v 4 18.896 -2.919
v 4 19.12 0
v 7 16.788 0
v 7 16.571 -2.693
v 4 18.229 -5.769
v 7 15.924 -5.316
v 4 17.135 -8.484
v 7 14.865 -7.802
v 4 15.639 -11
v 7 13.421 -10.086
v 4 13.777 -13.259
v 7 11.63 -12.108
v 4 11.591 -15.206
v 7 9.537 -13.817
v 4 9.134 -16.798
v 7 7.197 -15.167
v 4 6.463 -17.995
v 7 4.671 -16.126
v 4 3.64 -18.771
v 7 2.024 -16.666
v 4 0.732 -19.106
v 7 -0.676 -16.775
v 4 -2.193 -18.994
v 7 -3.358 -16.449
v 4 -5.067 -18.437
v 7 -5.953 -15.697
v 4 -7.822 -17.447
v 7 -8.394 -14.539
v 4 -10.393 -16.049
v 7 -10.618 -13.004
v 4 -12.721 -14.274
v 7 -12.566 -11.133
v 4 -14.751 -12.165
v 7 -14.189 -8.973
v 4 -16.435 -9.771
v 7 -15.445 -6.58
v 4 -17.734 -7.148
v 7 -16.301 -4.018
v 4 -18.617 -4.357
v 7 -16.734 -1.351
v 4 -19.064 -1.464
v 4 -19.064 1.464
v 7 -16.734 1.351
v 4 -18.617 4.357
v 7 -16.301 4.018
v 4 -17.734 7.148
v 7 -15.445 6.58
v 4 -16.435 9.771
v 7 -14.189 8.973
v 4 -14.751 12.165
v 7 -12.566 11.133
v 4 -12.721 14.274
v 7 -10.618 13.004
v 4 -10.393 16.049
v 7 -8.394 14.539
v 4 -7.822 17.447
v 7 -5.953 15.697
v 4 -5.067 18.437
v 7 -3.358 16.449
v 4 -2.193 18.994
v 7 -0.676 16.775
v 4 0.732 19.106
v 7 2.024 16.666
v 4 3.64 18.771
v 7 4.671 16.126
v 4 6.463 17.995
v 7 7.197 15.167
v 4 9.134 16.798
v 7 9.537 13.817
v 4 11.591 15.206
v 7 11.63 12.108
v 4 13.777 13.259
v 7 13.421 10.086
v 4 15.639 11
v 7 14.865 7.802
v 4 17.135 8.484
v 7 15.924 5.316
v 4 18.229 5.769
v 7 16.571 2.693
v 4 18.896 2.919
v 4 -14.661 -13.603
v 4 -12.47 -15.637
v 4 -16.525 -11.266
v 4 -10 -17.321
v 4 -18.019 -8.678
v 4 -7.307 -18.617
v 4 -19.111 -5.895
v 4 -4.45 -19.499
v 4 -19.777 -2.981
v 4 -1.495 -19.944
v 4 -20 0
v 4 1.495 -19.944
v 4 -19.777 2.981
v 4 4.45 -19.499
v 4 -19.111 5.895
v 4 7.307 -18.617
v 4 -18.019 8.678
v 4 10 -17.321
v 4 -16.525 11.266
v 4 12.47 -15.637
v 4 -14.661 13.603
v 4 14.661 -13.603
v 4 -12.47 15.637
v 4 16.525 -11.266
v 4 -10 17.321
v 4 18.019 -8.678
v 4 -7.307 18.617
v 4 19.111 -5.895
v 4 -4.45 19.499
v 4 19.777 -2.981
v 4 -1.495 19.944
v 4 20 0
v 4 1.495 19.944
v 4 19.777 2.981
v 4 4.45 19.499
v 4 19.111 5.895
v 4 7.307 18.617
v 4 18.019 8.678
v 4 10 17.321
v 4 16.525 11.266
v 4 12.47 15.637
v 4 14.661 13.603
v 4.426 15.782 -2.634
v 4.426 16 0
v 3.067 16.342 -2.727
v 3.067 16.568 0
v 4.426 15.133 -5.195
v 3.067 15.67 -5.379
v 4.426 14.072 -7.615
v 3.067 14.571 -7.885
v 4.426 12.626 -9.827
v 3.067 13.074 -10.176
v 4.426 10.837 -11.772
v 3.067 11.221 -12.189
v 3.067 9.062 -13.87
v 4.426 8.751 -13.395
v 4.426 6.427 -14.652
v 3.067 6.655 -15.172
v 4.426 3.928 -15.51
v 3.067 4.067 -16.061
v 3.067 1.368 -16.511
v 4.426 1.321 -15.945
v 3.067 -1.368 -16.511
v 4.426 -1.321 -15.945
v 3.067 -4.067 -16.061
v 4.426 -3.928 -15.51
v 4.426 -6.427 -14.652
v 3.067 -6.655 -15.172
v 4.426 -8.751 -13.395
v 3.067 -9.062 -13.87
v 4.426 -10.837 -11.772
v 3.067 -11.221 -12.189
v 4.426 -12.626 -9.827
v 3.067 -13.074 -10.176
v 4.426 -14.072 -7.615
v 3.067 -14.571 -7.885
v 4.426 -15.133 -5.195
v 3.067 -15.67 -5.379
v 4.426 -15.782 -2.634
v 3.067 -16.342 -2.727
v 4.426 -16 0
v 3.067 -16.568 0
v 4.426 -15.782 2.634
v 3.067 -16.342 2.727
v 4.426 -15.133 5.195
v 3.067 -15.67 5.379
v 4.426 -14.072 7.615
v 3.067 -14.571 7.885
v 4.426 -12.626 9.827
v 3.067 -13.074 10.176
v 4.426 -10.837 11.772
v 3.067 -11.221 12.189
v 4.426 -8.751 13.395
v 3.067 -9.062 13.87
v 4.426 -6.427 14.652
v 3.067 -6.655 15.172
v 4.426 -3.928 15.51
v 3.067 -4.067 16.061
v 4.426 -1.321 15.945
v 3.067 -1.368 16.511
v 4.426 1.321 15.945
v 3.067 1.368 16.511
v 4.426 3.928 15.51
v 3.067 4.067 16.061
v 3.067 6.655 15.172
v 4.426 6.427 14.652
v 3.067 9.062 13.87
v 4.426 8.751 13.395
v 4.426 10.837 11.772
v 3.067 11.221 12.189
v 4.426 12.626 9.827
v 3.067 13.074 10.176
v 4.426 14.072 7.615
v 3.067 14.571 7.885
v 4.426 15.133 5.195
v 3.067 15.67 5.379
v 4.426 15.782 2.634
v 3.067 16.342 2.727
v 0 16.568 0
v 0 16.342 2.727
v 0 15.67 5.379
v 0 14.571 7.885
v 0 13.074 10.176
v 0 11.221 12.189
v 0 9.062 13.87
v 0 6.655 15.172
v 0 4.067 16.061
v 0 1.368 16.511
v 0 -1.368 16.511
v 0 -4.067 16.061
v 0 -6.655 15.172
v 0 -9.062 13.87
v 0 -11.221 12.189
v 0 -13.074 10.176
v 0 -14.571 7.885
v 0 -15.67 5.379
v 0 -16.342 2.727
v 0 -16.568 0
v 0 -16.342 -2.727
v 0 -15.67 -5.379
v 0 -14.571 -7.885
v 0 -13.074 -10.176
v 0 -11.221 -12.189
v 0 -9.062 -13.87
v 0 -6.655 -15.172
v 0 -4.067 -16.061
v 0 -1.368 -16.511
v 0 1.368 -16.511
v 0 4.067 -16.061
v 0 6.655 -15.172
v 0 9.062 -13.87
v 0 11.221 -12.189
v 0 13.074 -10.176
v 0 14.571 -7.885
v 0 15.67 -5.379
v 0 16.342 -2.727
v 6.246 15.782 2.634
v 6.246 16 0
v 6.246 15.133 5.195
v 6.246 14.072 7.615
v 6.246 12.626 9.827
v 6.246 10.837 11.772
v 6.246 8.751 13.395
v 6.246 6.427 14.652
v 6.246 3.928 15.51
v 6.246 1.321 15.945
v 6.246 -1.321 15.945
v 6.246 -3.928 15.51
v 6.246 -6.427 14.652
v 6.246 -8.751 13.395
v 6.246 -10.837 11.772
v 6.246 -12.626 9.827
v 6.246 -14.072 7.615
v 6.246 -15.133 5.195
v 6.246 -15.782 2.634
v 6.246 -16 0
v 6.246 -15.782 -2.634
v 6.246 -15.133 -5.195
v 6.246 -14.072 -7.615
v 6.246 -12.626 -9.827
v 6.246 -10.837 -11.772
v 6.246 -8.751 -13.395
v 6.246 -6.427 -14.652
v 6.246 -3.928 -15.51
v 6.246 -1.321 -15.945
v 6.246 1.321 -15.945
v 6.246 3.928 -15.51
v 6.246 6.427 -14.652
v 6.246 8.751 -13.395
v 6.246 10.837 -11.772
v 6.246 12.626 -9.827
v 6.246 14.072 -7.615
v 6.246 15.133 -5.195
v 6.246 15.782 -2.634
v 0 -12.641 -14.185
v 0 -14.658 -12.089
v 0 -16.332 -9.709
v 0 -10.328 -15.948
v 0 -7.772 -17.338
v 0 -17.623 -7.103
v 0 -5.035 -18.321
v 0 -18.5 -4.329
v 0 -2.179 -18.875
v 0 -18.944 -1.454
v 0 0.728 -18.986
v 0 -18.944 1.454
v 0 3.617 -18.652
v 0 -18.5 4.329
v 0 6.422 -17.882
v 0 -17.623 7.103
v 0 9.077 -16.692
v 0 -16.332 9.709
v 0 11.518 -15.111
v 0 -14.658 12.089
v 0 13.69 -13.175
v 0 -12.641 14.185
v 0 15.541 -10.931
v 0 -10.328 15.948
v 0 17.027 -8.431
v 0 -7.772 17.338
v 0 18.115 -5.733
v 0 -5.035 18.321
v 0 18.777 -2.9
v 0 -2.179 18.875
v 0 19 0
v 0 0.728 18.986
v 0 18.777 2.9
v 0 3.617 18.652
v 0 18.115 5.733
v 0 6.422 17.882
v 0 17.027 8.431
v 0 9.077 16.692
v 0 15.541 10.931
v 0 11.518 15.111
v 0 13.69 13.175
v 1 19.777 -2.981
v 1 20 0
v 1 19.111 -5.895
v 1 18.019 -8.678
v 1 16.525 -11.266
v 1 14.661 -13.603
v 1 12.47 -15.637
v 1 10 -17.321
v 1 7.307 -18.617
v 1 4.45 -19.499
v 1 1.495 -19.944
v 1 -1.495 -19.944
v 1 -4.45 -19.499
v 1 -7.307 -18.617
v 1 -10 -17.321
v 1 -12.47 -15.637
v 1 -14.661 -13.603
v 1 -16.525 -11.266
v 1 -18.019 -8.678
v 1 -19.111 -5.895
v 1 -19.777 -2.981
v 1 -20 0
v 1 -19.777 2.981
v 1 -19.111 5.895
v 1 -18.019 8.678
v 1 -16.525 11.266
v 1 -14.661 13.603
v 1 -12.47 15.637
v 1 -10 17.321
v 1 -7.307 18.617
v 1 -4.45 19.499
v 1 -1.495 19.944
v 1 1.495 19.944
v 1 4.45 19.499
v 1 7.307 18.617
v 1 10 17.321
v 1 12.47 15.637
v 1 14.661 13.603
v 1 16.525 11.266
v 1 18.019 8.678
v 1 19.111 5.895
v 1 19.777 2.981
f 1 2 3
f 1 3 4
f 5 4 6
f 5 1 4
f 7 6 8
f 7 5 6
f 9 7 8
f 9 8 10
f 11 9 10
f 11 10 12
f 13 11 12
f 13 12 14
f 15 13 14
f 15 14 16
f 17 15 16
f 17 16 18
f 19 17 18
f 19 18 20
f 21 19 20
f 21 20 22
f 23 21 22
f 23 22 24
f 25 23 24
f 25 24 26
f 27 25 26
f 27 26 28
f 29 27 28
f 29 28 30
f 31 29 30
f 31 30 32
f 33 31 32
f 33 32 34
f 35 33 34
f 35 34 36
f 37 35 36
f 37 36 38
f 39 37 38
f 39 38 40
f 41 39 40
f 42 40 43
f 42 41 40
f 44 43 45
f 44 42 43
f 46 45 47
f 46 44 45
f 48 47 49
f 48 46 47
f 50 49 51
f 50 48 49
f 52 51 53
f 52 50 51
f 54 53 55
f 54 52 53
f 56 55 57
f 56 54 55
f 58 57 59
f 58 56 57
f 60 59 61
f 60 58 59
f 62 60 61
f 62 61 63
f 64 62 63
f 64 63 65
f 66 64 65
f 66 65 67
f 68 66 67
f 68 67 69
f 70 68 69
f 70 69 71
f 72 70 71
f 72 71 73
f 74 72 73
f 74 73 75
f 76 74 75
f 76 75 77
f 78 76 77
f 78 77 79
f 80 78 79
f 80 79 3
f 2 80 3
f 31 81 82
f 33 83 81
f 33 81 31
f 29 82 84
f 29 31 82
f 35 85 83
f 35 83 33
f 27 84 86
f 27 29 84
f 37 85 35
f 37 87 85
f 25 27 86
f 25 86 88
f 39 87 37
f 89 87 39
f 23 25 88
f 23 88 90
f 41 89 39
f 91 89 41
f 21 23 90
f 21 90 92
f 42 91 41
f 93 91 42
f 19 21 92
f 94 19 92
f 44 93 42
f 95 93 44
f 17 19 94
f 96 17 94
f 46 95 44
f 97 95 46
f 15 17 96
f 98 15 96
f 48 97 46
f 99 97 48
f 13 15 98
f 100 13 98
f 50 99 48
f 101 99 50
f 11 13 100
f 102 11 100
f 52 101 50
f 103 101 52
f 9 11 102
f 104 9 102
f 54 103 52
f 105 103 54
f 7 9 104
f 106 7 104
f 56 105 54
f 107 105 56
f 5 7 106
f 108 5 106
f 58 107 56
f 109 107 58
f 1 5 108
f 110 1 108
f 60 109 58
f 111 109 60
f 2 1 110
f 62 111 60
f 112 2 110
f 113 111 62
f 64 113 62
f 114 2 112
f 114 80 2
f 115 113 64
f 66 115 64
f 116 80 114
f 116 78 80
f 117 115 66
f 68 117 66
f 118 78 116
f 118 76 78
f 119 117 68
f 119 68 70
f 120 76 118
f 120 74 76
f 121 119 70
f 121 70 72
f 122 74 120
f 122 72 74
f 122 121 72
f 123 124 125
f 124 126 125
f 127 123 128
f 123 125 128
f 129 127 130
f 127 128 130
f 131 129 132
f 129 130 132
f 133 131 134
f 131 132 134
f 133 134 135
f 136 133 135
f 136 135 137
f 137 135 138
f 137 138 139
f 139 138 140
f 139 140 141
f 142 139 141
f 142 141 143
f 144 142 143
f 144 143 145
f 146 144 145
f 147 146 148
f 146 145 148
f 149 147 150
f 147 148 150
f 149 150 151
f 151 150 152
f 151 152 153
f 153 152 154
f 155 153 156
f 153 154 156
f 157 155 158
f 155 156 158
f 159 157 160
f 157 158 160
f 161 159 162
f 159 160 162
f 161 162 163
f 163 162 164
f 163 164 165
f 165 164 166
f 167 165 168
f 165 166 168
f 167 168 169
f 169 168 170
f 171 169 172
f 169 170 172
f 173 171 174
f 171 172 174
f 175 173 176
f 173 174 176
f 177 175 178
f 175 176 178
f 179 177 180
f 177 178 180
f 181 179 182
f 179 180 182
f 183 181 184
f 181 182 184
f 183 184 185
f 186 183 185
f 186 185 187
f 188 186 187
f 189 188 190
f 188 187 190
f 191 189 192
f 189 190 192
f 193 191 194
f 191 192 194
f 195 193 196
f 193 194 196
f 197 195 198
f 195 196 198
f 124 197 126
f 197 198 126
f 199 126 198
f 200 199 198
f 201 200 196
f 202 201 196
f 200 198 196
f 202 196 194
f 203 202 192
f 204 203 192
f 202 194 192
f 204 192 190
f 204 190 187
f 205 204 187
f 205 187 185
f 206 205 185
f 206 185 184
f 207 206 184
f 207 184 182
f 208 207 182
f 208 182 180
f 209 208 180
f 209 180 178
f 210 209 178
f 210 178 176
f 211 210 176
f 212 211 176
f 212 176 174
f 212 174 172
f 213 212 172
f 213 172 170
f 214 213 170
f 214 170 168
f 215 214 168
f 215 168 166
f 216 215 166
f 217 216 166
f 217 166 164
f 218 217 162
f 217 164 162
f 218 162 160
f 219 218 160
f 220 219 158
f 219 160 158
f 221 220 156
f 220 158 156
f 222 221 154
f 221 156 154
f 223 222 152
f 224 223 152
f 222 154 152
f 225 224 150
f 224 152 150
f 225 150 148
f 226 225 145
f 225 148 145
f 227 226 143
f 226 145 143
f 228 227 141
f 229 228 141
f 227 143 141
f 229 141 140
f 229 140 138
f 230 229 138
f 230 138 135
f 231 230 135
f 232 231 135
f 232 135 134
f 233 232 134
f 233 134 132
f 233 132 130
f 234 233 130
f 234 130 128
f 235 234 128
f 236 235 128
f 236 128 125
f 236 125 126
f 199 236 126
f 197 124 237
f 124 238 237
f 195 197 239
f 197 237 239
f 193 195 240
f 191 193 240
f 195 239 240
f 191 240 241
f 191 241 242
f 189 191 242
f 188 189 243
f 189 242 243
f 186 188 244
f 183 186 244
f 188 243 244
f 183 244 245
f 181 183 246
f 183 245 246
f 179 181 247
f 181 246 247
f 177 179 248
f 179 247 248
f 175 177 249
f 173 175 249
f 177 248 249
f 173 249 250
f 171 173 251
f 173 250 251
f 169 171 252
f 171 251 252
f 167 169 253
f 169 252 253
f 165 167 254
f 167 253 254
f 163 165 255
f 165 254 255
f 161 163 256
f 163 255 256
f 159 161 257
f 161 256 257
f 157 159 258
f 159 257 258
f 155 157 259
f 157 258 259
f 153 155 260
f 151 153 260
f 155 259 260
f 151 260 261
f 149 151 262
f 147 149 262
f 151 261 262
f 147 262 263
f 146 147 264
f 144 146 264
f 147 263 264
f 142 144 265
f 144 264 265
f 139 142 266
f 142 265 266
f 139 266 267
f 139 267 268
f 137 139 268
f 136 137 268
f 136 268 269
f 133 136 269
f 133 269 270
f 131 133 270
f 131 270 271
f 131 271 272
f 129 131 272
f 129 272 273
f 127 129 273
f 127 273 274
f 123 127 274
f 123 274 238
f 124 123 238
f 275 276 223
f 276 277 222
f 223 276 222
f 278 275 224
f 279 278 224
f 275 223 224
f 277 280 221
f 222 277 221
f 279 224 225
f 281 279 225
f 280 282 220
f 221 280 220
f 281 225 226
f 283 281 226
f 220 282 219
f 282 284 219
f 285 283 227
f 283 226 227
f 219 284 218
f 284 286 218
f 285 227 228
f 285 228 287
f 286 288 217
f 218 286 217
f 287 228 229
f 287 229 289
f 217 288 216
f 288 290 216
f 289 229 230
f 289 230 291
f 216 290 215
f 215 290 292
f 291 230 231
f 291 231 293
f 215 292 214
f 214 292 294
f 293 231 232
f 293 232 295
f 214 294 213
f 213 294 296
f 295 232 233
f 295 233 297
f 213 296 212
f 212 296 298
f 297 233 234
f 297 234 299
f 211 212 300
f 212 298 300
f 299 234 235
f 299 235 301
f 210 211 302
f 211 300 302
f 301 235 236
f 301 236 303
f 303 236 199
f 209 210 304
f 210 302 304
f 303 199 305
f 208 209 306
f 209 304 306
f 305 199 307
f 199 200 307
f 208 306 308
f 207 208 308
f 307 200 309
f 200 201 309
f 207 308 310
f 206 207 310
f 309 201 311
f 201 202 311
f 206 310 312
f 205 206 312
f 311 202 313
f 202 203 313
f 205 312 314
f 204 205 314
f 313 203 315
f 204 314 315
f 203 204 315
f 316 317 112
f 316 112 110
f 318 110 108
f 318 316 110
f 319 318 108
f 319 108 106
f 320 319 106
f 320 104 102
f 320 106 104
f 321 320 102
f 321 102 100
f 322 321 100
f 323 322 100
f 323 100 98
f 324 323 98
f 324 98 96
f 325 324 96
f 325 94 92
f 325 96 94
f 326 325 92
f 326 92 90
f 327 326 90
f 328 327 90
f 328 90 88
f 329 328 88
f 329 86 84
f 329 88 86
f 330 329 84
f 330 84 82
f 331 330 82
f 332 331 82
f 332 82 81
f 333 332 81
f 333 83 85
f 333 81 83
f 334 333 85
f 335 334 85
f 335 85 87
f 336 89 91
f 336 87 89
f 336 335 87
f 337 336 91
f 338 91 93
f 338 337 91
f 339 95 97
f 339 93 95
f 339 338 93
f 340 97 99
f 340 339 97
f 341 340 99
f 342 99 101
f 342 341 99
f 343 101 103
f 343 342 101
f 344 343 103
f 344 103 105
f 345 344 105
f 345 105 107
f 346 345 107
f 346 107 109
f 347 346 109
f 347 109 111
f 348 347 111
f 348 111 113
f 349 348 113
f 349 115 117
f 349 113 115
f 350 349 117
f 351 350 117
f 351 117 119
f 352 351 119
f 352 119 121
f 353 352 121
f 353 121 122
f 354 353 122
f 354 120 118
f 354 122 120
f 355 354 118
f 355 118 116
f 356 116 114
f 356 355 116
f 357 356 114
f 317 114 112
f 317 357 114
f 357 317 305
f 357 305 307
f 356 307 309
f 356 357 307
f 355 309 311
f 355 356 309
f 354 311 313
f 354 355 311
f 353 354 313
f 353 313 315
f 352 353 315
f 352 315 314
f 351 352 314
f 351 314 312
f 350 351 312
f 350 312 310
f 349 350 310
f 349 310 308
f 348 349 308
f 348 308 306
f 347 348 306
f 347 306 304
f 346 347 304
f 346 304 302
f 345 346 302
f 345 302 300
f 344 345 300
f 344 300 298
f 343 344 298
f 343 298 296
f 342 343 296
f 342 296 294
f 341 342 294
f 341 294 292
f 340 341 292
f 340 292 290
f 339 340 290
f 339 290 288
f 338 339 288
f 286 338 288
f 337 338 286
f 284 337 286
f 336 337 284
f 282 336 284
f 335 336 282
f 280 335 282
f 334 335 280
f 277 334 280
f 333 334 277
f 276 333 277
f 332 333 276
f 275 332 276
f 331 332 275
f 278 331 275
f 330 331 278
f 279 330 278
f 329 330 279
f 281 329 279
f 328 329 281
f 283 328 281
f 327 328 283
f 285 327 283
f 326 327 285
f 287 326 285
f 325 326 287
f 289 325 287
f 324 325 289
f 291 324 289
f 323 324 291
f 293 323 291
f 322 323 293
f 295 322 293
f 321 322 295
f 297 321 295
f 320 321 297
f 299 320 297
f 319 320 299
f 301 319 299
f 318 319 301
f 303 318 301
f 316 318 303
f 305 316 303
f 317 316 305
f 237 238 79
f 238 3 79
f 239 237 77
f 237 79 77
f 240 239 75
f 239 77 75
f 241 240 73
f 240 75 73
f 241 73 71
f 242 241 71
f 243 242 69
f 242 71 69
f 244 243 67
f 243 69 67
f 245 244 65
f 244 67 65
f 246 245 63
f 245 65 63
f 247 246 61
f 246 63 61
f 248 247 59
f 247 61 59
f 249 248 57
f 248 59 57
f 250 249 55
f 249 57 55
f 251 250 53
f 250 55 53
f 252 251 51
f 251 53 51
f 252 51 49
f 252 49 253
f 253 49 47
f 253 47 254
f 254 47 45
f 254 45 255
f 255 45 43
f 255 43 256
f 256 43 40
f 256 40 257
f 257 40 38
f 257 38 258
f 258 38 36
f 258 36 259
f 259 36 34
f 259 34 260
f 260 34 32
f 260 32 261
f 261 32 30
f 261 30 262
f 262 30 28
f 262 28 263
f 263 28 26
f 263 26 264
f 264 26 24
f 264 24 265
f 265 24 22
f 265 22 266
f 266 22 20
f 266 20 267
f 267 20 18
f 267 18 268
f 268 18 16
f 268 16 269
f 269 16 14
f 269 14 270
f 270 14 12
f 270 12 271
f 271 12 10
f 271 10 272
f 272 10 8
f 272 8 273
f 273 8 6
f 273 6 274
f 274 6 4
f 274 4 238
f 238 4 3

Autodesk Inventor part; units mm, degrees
ref_plane "YZ Plane" through (0, 0, 0) normal (1, 0, 0) x (0, 1, 0)
ref_plane "XZ Plane" through (0, 0, 0) normal (0, 1, 0) x (-1, 0, 0)
ref_plane "XY Plane" through (0, 0, 0) normal (0, 0, 1) x (1, 0, 0)
sketch "Sketch1" plane through (0, 0, 0) normal (0, 0, 1) x (1, 0, 0)
  line L0 (4, 19.1204) -> (4, 20)
  line L1 (4, 20) -> (0, 20)
  line L2 (0, 20) -> (0, 16.5676)
  line L3 (0, 16.5676) -> (3.0669, 16.5676)
  line L4 (3.0669, 16.5676) -> (4.4257, 16)
  line L5 (4.4257, 16) -> (6.2458, 16)
  line L6 (6.2458, 16) -> (7, 16.7884)
  line L7 (7, 16.7884) -> (4, 19.1204)
  line L8 (0, 0) -> (20.4487, 0)
  dimension "d0" = 84.13
  dimension "d1" = 133.729
  dimension "d2" = 111.058
  dimension "d3" = 4
  dimension "d4" = 0.5675
  dimension "d5" = 4
  dimension "d6" = 0.7884
  dimension "d7" = 3
  dimension "d8" = 1.7197
  dimension "d9" = 32
revolve "Revolution1" add sketch "Sketch1" angle 360 about axis through (0, 0, 0) along (1, 0, 0)
chamfer "Fase1" distance 1 angle 45 1 edges at (0, -20, 0)
properties part number "Collar_Seal_Outer" material "Nylon-6/6"
